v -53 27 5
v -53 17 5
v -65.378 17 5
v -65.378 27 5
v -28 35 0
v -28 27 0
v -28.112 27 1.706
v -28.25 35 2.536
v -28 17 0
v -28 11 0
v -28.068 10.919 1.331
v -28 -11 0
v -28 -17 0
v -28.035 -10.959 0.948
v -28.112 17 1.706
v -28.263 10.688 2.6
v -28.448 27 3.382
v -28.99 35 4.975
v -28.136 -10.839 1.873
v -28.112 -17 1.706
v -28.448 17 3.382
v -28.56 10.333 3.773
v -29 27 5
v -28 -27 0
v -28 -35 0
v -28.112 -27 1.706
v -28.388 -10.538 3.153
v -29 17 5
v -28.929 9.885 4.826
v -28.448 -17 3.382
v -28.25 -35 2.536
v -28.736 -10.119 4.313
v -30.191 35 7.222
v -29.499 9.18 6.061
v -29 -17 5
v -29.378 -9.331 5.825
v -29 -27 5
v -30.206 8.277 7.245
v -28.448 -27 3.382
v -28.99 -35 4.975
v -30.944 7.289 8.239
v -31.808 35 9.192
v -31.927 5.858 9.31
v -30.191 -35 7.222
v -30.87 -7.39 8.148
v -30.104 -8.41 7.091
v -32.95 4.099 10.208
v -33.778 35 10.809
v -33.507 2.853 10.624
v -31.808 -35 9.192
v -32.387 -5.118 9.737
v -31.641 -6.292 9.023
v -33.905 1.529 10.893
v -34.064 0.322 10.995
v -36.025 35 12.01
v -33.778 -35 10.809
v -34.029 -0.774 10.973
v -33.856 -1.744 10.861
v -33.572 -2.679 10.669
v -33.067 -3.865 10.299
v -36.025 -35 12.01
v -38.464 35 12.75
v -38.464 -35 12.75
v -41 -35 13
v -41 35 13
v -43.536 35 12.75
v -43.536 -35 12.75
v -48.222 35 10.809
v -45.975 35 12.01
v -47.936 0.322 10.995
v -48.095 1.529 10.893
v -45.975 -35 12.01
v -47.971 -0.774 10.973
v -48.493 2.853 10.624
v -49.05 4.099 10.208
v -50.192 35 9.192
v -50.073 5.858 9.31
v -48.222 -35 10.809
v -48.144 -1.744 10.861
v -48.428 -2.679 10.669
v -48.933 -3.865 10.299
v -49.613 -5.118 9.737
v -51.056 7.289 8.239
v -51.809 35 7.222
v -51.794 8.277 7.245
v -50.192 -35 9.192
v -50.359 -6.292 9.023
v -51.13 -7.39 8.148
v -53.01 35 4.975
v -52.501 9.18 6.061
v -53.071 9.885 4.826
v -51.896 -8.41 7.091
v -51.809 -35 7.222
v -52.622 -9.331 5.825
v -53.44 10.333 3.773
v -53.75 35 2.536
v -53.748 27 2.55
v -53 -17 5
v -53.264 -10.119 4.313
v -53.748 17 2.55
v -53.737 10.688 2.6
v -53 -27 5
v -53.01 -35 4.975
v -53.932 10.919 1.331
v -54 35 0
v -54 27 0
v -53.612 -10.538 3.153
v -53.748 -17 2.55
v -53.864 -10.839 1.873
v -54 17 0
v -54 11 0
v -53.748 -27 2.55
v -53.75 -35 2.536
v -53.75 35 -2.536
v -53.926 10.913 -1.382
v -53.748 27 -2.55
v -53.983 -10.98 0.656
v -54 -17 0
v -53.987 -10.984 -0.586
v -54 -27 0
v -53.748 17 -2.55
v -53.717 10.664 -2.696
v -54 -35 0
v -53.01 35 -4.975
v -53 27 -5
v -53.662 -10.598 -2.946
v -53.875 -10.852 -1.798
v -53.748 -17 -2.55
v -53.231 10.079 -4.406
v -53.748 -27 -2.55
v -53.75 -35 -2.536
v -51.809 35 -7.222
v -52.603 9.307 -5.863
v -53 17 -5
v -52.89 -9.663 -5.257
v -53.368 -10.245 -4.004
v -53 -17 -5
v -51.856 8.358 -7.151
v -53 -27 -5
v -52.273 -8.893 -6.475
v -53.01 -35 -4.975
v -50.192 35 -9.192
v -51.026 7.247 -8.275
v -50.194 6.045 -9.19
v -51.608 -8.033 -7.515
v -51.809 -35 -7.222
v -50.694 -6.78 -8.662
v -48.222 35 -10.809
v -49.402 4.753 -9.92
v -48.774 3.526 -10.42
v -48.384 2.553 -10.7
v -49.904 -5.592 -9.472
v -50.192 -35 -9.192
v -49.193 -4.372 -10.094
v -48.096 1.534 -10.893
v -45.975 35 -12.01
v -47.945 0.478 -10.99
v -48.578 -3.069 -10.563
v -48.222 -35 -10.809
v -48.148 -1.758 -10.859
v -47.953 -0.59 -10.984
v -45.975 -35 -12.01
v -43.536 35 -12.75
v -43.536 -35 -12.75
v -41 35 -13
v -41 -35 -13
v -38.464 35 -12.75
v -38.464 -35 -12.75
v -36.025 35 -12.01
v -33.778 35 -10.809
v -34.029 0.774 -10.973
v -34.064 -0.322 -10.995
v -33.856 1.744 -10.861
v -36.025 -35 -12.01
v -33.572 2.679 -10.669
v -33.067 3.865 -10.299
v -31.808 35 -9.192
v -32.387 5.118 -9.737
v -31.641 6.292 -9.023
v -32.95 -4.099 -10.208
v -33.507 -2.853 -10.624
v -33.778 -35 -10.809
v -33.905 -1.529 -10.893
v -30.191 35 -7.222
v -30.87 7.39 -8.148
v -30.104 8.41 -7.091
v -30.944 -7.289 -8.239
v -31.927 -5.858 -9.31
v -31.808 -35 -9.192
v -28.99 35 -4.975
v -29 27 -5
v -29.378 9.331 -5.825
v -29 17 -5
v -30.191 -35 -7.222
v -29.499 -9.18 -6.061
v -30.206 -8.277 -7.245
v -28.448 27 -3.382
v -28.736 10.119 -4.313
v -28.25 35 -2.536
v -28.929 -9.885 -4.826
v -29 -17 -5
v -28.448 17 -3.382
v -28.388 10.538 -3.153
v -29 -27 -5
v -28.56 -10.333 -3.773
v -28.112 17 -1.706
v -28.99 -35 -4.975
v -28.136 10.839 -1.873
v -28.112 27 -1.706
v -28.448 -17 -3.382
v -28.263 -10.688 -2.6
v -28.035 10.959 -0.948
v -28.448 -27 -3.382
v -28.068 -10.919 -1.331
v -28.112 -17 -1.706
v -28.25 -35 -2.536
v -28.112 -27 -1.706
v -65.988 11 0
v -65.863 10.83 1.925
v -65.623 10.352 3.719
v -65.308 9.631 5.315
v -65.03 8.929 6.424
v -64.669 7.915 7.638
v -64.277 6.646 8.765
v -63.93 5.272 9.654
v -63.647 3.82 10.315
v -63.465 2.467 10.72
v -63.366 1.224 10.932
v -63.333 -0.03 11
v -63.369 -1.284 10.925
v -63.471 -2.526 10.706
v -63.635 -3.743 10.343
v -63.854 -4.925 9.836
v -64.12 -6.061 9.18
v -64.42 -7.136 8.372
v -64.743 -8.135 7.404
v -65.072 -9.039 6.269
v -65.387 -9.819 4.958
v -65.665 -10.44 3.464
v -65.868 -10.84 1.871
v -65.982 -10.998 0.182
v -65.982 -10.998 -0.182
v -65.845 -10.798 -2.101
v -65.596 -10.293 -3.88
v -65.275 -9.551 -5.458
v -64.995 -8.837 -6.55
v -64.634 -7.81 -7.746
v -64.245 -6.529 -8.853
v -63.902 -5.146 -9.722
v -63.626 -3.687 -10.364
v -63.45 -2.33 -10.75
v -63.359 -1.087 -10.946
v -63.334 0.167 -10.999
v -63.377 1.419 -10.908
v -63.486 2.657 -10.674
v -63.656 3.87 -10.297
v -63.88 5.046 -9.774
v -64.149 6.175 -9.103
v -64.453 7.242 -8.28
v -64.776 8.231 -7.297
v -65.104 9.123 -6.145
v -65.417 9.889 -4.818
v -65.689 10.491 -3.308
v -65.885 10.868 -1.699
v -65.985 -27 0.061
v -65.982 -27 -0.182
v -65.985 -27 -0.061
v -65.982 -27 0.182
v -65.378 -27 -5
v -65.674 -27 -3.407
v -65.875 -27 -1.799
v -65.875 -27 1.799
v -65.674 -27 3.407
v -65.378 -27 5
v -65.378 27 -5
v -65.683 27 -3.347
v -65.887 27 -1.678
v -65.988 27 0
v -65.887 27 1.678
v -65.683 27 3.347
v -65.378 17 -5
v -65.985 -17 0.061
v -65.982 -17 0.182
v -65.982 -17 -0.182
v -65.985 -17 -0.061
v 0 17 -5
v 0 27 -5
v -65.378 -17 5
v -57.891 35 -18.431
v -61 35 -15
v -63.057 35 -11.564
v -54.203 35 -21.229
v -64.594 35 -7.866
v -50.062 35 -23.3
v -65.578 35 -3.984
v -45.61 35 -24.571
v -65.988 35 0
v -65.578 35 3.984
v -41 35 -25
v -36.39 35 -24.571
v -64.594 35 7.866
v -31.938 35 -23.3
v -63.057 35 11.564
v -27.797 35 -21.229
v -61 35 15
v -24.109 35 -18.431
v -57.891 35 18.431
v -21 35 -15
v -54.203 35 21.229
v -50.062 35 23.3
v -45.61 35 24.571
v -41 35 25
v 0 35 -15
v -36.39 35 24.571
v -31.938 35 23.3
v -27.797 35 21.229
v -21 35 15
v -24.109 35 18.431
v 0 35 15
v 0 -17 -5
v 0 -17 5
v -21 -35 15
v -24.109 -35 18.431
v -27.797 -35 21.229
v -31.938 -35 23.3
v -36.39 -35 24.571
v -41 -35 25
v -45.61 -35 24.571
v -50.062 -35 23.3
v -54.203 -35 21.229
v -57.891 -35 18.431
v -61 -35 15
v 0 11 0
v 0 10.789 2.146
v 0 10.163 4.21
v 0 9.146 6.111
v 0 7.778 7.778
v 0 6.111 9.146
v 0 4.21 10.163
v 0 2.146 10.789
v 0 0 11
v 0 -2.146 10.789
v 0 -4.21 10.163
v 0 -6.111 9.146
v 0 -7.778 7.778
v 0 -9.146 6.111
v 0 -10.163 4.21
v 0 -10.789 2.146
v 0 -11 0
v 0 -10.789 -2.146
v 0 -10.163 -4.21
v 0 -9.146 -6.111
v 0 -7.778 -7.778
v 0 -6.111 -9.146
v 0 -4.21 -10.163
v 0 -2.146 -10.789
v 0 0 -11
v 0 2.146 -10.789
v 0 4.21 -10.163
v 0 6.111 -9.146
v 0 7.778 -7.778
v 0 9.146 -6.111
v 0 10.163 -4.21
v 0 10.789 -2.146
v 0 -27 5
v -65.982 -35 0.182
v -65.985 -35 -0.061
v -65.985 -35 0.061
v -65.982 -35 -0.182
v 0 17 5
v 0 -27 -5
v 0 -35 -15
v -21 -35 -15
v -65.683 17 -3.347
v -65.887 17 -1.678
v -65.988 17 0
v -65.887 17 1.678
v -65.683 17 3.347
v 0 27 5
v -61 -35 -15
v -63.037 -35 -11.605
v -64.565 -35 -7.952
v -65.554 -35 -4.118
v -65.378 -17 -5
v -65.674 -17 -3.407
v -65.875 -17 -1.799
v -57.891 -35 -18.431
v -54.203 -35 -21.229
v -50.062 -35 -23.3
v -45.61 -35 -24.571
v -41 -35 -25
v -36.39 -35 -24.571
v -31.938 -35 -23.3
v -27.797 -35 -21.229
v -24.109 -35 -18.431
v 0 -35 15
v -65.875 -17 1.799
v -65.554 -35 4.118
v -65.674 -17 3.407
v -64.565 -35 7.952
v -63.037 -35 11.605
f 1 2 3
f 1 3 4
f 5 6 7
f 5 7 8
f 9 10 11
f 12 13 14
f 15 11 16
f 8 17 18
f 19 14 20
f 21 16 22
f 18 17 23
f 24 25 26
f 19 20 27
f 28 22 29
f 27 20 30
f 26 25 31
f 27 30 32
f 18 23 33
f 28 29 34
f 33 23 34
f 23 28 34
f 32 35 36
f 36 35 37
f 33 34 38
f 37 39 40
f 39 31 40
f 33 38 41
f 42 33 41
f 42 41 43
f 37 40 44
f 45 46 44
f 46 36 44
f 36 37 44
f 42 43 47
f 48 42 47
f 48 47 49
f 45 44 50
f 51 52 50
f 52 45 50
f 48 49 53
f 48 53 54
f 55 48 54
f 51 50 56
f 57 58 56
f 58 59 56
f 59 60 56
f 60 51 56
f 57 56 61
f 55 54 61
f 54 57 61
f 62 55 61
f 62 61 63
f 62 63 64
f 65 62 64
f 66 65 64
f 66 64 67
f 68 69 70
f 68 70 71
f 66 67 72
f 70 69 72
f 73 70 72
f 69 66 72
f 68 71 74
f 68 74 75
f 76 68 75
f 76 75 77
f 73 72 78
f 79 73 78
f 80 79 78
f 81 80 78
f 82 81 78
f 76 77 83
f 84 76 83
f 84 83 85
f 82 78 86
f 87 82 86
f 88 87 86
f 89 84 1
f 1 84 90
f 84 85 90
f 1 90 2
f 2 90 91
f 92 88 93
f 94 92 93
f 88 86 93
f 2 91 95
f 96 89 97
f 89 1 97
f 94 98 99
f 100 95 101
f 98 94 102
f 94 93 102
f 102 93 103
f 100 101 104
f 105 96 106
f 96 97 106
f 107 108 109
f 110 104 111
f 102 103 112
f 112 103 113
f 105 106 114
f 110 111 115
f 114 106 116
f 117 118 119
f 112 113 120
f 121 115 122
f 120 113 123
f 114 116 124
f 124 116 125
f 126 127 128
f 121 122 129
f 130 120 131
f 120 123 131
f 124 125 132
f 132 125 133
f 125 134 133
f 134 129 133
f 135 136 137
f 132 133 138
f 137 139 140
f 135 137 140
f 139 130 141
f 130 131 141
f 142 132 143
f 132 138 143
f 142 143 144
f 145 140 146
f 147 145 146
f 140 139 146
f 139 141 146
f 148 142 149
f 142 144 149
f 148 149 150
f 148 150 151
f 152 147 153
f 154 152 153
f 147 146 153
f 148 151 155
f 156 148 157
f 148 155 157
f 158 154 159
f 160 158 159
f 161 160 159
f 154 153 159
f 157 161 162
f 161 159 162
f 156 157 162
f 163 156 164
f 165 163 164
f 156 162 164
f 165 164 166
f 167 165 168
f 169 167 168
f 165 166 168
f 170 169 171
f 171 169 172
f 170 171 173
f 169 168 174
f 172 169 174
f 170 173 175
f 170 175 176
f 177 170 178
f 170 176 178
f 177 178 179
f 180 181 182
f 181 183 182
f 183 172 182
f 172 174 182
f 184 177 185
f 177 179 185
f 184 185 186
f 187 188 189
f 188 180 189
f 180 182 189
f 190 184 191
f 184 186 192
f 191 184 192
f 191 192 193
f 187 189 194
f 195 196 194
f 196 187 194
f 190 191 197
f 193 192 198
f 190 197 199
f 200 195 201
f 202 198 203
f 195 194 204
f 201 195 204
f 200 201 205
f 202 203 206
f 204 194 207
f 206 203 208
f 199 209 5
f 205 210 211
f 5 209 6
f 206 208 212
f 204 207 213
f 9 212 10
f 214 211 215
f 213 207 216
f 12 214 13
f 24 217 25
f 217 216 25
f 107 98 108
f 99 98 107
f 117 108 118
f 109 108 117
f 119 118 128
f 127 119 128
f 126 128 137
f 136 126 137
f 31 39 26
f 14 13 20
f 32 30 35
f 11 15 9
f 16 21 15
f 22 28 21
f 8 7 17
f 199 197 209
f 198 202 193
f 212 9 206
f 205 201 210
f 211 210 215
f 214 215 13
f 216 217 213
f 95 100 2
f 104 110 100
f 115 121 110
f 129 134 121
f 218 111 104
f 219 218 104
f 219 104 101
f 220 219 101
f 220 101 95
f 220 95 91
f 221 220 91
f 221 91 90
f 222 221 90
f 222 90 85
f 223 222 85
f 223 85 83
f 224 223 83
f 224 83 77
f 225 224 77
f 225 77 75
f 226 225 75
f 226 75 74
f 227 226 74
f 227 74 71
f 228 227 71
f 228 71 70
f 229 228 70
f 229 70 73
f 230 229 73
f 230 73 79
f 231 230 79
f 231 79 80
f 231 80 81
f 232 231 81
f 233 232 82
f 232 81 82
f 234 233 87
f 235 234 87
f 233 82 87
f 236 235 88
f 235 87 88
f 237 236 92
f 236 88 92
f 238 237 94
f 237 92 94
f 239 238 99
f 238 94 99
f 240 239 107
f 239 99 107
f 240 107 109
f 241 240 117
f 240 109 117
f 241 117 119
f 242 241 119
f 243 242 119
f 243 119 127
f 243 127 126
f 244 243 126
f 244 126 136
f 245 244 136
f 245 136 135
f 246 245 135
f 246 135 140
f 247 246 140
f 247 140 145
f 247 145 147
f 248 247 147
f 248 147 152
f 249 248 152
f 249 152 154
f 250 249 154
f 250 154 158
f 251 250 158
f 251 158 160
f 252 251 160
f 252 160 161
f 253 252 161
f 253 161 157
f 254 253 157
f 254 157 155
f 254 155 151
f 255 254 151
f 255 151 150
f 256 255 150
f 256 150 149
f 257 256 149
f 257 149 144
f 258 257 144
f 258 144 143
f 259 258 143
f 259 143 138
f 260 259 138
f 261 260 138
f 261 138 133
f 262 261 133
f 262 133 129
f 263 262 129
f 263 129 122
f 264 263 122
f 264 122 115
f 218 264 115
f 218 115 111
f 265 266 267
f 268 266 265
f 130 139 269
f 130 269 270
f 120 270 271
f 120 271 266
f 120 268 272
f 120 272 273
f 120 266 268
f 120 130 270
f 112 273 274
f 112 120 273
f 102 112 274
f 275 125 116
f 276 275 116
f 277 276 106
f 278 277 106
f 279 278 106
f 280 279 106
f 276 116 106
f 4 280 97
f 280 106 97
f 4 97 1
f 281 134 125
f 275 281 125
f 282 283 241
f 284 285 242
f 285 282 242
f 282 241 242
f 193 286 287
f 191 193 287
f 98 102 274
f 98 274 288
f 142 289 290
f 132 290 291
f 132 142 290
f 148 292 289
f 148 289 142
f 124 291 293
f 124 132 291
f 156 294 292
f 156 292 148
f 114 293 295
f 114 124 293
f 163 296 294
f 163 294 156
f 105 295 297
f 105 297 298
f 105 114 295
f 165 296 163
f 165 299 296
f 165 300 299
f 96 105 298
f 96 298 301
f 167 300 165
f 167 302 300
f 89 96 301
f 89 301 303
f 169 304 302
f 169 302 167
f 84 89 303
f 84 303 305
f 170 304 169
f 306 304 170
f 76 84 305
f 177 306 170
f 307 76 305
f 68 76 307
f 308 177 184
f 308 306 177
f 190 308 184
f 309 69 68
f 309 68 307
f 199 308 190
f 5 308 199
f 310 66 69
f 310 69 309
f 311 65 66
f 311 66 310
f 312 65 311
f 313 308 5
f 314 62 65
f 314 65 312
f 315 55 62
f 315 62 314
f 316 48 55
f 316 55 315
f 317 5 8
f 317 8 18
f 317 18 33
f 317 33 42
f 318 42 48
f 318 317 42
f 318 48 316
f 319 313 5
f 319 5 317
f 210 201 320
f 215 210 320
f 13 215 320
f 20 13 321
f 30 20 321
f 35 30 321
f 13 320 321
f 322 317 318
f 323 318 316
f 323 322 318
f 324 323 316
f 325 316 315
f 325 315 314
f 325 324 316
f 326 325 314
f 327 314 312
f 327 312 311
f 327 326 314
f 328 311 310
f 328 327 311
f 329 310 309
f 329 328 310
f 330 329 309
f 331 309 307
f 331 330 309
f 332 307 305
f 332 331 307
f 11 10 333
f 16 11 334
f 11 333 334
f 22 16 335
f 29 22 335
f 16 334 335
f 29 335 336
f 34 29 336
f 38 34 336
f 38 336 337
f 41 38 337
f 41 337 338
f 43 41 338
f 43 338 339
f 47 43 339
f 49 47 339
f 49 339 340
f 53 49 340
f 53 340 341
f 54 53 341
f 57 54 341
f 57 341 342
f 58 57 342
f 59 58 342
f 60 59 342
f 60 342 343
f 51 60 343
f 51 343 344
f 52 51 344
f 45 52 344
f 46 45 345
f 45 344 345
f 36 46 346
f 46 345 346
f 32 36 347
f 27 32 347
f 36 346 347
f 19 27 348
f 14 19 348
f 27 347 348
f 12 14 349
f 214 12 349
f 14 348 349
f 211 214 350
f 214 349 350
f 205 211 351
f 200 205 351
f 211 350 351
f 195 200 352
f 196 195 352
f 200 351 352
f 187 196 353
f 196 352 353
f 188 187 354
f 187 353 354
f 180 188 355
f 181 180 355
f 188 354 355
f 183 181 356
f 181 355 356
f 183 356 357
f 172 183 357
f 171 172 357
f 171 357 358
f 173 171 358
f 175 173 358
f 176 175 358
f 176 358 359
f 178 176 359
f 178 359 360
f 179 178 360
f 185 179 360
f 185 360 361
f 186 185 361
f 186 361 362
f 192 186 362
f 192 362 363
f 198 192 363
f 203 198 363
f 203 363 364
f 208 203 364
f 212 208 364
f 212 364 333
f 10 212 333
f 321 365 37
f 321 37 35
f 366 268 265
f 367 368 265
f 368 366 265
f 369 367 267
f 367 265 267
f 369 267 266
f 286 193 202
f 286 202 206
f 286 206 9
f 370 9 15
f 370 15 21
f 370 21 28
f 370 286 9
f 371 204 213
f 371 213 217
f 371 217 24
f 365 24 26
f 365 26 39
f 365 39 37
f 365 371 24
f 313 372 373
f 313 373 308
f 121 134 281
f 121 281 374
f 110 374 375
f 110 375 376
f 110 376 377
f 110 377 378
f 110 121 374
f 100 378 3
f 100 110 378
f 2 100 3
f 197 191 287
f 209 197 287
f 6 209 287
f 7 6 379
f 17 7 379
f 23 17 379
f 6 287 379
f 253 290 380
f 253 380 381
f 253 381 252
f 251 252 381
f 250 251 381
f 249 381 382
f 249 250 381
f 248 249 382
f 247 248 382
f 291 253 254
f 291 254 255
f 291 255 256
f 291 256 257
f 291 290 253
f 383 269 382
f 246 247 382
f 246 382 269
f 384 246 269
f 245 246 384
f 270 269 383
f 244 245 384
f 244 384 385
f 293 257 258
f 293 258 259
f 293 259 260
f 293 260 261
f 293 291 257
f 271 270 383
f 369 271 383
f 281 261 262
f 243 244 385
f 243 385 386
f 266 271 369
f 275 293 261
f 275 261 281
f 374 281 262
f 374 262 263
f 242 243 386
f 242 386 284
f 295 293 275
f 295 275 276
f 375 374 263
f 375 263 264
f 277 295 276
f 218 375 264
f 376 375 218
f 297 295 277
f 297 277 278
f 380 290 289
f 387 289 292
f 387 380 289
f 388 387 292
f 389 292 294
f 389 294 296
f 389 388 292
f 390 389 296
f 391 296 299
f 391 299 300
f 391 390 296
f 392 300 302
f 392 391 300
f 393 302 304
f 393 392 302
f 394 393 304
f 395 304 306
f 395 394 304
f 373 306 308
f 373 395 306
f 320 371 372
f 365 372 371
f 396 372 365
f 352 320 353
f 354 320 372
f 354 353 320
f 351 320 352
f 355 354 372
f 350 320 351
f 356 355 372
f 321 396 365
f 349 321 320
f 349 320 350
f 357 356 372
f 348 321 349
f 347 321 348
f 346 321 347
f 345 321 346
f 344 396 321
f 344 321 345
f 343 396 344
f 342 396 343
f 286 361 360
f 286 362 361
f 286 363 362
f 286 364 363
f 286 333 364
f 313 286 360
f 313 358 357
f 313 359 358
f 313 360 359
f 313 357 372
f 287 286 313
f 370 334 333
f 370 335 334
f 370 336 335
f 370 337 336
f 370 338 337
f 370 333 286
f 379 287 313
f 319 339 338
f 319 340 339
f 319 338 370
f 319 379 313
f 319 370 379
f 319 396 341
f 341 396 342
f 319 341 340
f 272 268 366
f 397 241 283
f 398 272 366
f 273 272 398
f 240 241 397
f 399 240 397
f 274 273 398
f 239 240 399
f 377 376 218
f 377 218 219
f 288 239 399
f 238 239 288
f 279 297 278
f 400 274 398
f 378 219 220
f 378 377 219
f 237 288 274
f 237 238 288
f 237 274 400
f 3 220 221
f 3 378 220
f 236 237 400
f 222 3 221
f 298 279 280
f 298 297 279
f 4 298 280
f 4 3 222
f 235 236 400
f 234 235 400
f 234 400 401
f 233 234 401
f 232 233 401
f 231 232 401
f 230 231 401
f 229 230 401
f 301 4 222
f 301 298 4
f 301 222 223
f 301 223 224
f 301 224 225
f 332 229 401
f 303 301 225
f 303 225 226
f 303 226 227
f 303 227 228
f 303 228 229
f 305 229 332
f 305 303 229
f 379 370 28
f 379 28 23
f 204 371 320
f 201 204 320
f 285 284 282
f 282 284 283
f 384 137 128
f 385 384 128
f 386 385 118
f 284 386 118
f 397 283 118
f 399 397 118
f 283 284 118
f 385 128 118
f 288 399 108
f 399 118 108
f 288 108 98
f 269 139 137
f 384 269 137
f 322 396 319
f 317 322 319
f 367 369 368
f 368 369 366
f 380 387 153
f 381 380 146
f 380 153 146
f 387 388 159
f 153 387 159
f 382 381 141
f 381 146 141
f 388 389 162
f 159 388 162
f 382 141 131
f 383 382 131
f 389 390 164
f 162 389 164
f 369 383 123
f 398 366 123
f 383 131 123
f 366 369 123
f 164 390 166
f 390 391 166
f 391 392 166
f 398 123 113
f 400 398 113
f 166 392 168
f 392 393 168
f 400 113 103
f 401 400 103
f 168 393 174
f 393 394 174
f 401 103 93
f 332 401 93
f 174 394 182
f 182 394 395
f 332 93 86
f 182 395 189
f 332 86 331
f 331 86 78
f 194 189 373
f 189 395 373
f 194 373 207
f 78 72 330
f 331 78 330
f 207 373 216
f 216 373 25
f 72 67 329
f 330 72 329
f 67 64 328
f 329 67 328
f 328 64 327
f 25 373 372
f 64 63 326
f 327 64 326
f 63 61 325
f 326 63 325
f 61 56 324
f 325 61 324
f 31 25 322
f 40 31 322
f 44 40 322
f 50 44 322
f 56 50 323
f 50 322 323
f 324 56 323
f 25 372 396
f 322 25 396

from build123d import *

# Parameters (mm, degrees)
F0_W        = 70
F0_H        = 30
F1_DEPTH    = 66
F3_DEPTH    = 70
F4_R        = 13
F5_DEPTH    = 71
F6_W        = 10
F6_H        = 10
F6_R        = 11
F7_DEPTH    = 70
F8_T1_DEPTH = 149.09177361
F9_T1_DEPTH = 8.9088895058
F9_T3_DEPTH = 6.9088895058


# Not quite as in the source:
# - a fillet or chamfer that OpenCascade refuses, or shapes differently, is made with other operations: its cross-section is extruded or revolved along the edge and cut away or added


with BuildPart() as f1:
    # F0 (on Right) → F1 (new body)
    with BuildSketch(Plane.YZ):
        Rectangle(F0_W, F0_H)
    extrude(amount=-F1_DEPTH)

    # F2 (on face) → F3 (join)
    with BuildSketch(Plane.XZ.offset(35)):
        with BuildLine():
            Line((-41, 15), (-21, 15))
            ThreePointArc((-21, 15), (-41, 25), (-61, 15))
            Line((-61, 15), (-41, 15))
        make_face()
        with BuildLine():
            ThreePointArc((-61, -15), (-41, -25), (-21, -15))
            Line((-21, -15), (-61, -15))
        make_face()
    extrude(amount=-F3_DEPTH)

    # F4 (on face) → F5 (cut)
    with BuildSketch(Plane.XZ.offset(35)):
        with Locations((-41, 0)):
            Circle(F4_R)
    extrude(amount=-F5_DEPTH, mode=Mode.SUBTRACT)

    # F6 (on face) → F7 (cut)
    with BuildSketch(Plane.YZ):
        with Locations((-22, 0)):
            Rectangle(F6_W, F6_H)
        Circle(F6_R)
        with Locations((22, 0)):
            Rectangle(F6_W, F6_H)
    extrude(amount=-F7_DEPTH, mode=Mode.SUBTRACT)

    # F8: fillet of radius 27.5220346111 on 2 edges, made by hand

    # F8_s2 → F8_t1 (cut)
    with BuildSketch(Plane.XZ.offset(-74.545886805)):
        with BuildLine():
            ThreePointArc((-66, -0.818354722), (-64.7202462083, 7.4765284314), (-61, 15))
            Line((-61, 15), (-66, 15))
            Line((-66, 15), (-66, -0.818354722))
        make_face()
        with BuildLine():
            ThreePointArc((-61, -15), (-64.7202462083, -7.4765284314), (-66, 0.818354722))
            Line((-66, 0.818354722), (-66, -15))
            Line((-66, -15), (-61, -15))
        make_face()
    extrude(amount=F8_T1_DEPTH, mode=Mode.SUBTRACT)

    # F9: fillet of radius 5 on 2 edges, made by hand

    # F9_s2 → F9_t1 (cut)
    with BuildSketch(Plane.XZ.offset(26.5455552471)):
        with BuildLine():
            ThreePointArc((-65.9818255238, 0.1816786841), (-65.9851273284, 0), (-65.9818255238, -0.1816786841))
            ThreePointArc((-65.9818255238, -0.1816786841), (-65.9849780634, -0.0908442999), (-65.9878306136, 0))
            ThreePointArc((-65.9878306136, 0), (-65.9849780634, 0.0908442999), (-65.9818255238, 0.1816786841))
        make_face()
    extrude(amount=F9_T1_DEPTH, mode=Mode.SUBTRACT)

    # F9_s4 → F9_t3 (cut)
    with BuildSketch(Plane.XZ.offset(10.5455552471)):
        with BuildLine():
            ThreePointArc((-65.9818255238, 0.1816786841), (-65.9851273284, 0), (-65.9818255238, -0.1816786841))
            ThreePointArc((-65.9818255238, -0.1816786841), (-65.9849780634, -0.0908442999), (-65.9878306136, 0))
            ThreePointArc((-65.9878306136, 0), (-65.9849780634, 0.0908442999), (-65.9818255238, 0.1816786841))
        make_face()
    extrude(amount=F9_T3_DEPTH, mode=Mode.SUBTRACT)


solid = f1.part
